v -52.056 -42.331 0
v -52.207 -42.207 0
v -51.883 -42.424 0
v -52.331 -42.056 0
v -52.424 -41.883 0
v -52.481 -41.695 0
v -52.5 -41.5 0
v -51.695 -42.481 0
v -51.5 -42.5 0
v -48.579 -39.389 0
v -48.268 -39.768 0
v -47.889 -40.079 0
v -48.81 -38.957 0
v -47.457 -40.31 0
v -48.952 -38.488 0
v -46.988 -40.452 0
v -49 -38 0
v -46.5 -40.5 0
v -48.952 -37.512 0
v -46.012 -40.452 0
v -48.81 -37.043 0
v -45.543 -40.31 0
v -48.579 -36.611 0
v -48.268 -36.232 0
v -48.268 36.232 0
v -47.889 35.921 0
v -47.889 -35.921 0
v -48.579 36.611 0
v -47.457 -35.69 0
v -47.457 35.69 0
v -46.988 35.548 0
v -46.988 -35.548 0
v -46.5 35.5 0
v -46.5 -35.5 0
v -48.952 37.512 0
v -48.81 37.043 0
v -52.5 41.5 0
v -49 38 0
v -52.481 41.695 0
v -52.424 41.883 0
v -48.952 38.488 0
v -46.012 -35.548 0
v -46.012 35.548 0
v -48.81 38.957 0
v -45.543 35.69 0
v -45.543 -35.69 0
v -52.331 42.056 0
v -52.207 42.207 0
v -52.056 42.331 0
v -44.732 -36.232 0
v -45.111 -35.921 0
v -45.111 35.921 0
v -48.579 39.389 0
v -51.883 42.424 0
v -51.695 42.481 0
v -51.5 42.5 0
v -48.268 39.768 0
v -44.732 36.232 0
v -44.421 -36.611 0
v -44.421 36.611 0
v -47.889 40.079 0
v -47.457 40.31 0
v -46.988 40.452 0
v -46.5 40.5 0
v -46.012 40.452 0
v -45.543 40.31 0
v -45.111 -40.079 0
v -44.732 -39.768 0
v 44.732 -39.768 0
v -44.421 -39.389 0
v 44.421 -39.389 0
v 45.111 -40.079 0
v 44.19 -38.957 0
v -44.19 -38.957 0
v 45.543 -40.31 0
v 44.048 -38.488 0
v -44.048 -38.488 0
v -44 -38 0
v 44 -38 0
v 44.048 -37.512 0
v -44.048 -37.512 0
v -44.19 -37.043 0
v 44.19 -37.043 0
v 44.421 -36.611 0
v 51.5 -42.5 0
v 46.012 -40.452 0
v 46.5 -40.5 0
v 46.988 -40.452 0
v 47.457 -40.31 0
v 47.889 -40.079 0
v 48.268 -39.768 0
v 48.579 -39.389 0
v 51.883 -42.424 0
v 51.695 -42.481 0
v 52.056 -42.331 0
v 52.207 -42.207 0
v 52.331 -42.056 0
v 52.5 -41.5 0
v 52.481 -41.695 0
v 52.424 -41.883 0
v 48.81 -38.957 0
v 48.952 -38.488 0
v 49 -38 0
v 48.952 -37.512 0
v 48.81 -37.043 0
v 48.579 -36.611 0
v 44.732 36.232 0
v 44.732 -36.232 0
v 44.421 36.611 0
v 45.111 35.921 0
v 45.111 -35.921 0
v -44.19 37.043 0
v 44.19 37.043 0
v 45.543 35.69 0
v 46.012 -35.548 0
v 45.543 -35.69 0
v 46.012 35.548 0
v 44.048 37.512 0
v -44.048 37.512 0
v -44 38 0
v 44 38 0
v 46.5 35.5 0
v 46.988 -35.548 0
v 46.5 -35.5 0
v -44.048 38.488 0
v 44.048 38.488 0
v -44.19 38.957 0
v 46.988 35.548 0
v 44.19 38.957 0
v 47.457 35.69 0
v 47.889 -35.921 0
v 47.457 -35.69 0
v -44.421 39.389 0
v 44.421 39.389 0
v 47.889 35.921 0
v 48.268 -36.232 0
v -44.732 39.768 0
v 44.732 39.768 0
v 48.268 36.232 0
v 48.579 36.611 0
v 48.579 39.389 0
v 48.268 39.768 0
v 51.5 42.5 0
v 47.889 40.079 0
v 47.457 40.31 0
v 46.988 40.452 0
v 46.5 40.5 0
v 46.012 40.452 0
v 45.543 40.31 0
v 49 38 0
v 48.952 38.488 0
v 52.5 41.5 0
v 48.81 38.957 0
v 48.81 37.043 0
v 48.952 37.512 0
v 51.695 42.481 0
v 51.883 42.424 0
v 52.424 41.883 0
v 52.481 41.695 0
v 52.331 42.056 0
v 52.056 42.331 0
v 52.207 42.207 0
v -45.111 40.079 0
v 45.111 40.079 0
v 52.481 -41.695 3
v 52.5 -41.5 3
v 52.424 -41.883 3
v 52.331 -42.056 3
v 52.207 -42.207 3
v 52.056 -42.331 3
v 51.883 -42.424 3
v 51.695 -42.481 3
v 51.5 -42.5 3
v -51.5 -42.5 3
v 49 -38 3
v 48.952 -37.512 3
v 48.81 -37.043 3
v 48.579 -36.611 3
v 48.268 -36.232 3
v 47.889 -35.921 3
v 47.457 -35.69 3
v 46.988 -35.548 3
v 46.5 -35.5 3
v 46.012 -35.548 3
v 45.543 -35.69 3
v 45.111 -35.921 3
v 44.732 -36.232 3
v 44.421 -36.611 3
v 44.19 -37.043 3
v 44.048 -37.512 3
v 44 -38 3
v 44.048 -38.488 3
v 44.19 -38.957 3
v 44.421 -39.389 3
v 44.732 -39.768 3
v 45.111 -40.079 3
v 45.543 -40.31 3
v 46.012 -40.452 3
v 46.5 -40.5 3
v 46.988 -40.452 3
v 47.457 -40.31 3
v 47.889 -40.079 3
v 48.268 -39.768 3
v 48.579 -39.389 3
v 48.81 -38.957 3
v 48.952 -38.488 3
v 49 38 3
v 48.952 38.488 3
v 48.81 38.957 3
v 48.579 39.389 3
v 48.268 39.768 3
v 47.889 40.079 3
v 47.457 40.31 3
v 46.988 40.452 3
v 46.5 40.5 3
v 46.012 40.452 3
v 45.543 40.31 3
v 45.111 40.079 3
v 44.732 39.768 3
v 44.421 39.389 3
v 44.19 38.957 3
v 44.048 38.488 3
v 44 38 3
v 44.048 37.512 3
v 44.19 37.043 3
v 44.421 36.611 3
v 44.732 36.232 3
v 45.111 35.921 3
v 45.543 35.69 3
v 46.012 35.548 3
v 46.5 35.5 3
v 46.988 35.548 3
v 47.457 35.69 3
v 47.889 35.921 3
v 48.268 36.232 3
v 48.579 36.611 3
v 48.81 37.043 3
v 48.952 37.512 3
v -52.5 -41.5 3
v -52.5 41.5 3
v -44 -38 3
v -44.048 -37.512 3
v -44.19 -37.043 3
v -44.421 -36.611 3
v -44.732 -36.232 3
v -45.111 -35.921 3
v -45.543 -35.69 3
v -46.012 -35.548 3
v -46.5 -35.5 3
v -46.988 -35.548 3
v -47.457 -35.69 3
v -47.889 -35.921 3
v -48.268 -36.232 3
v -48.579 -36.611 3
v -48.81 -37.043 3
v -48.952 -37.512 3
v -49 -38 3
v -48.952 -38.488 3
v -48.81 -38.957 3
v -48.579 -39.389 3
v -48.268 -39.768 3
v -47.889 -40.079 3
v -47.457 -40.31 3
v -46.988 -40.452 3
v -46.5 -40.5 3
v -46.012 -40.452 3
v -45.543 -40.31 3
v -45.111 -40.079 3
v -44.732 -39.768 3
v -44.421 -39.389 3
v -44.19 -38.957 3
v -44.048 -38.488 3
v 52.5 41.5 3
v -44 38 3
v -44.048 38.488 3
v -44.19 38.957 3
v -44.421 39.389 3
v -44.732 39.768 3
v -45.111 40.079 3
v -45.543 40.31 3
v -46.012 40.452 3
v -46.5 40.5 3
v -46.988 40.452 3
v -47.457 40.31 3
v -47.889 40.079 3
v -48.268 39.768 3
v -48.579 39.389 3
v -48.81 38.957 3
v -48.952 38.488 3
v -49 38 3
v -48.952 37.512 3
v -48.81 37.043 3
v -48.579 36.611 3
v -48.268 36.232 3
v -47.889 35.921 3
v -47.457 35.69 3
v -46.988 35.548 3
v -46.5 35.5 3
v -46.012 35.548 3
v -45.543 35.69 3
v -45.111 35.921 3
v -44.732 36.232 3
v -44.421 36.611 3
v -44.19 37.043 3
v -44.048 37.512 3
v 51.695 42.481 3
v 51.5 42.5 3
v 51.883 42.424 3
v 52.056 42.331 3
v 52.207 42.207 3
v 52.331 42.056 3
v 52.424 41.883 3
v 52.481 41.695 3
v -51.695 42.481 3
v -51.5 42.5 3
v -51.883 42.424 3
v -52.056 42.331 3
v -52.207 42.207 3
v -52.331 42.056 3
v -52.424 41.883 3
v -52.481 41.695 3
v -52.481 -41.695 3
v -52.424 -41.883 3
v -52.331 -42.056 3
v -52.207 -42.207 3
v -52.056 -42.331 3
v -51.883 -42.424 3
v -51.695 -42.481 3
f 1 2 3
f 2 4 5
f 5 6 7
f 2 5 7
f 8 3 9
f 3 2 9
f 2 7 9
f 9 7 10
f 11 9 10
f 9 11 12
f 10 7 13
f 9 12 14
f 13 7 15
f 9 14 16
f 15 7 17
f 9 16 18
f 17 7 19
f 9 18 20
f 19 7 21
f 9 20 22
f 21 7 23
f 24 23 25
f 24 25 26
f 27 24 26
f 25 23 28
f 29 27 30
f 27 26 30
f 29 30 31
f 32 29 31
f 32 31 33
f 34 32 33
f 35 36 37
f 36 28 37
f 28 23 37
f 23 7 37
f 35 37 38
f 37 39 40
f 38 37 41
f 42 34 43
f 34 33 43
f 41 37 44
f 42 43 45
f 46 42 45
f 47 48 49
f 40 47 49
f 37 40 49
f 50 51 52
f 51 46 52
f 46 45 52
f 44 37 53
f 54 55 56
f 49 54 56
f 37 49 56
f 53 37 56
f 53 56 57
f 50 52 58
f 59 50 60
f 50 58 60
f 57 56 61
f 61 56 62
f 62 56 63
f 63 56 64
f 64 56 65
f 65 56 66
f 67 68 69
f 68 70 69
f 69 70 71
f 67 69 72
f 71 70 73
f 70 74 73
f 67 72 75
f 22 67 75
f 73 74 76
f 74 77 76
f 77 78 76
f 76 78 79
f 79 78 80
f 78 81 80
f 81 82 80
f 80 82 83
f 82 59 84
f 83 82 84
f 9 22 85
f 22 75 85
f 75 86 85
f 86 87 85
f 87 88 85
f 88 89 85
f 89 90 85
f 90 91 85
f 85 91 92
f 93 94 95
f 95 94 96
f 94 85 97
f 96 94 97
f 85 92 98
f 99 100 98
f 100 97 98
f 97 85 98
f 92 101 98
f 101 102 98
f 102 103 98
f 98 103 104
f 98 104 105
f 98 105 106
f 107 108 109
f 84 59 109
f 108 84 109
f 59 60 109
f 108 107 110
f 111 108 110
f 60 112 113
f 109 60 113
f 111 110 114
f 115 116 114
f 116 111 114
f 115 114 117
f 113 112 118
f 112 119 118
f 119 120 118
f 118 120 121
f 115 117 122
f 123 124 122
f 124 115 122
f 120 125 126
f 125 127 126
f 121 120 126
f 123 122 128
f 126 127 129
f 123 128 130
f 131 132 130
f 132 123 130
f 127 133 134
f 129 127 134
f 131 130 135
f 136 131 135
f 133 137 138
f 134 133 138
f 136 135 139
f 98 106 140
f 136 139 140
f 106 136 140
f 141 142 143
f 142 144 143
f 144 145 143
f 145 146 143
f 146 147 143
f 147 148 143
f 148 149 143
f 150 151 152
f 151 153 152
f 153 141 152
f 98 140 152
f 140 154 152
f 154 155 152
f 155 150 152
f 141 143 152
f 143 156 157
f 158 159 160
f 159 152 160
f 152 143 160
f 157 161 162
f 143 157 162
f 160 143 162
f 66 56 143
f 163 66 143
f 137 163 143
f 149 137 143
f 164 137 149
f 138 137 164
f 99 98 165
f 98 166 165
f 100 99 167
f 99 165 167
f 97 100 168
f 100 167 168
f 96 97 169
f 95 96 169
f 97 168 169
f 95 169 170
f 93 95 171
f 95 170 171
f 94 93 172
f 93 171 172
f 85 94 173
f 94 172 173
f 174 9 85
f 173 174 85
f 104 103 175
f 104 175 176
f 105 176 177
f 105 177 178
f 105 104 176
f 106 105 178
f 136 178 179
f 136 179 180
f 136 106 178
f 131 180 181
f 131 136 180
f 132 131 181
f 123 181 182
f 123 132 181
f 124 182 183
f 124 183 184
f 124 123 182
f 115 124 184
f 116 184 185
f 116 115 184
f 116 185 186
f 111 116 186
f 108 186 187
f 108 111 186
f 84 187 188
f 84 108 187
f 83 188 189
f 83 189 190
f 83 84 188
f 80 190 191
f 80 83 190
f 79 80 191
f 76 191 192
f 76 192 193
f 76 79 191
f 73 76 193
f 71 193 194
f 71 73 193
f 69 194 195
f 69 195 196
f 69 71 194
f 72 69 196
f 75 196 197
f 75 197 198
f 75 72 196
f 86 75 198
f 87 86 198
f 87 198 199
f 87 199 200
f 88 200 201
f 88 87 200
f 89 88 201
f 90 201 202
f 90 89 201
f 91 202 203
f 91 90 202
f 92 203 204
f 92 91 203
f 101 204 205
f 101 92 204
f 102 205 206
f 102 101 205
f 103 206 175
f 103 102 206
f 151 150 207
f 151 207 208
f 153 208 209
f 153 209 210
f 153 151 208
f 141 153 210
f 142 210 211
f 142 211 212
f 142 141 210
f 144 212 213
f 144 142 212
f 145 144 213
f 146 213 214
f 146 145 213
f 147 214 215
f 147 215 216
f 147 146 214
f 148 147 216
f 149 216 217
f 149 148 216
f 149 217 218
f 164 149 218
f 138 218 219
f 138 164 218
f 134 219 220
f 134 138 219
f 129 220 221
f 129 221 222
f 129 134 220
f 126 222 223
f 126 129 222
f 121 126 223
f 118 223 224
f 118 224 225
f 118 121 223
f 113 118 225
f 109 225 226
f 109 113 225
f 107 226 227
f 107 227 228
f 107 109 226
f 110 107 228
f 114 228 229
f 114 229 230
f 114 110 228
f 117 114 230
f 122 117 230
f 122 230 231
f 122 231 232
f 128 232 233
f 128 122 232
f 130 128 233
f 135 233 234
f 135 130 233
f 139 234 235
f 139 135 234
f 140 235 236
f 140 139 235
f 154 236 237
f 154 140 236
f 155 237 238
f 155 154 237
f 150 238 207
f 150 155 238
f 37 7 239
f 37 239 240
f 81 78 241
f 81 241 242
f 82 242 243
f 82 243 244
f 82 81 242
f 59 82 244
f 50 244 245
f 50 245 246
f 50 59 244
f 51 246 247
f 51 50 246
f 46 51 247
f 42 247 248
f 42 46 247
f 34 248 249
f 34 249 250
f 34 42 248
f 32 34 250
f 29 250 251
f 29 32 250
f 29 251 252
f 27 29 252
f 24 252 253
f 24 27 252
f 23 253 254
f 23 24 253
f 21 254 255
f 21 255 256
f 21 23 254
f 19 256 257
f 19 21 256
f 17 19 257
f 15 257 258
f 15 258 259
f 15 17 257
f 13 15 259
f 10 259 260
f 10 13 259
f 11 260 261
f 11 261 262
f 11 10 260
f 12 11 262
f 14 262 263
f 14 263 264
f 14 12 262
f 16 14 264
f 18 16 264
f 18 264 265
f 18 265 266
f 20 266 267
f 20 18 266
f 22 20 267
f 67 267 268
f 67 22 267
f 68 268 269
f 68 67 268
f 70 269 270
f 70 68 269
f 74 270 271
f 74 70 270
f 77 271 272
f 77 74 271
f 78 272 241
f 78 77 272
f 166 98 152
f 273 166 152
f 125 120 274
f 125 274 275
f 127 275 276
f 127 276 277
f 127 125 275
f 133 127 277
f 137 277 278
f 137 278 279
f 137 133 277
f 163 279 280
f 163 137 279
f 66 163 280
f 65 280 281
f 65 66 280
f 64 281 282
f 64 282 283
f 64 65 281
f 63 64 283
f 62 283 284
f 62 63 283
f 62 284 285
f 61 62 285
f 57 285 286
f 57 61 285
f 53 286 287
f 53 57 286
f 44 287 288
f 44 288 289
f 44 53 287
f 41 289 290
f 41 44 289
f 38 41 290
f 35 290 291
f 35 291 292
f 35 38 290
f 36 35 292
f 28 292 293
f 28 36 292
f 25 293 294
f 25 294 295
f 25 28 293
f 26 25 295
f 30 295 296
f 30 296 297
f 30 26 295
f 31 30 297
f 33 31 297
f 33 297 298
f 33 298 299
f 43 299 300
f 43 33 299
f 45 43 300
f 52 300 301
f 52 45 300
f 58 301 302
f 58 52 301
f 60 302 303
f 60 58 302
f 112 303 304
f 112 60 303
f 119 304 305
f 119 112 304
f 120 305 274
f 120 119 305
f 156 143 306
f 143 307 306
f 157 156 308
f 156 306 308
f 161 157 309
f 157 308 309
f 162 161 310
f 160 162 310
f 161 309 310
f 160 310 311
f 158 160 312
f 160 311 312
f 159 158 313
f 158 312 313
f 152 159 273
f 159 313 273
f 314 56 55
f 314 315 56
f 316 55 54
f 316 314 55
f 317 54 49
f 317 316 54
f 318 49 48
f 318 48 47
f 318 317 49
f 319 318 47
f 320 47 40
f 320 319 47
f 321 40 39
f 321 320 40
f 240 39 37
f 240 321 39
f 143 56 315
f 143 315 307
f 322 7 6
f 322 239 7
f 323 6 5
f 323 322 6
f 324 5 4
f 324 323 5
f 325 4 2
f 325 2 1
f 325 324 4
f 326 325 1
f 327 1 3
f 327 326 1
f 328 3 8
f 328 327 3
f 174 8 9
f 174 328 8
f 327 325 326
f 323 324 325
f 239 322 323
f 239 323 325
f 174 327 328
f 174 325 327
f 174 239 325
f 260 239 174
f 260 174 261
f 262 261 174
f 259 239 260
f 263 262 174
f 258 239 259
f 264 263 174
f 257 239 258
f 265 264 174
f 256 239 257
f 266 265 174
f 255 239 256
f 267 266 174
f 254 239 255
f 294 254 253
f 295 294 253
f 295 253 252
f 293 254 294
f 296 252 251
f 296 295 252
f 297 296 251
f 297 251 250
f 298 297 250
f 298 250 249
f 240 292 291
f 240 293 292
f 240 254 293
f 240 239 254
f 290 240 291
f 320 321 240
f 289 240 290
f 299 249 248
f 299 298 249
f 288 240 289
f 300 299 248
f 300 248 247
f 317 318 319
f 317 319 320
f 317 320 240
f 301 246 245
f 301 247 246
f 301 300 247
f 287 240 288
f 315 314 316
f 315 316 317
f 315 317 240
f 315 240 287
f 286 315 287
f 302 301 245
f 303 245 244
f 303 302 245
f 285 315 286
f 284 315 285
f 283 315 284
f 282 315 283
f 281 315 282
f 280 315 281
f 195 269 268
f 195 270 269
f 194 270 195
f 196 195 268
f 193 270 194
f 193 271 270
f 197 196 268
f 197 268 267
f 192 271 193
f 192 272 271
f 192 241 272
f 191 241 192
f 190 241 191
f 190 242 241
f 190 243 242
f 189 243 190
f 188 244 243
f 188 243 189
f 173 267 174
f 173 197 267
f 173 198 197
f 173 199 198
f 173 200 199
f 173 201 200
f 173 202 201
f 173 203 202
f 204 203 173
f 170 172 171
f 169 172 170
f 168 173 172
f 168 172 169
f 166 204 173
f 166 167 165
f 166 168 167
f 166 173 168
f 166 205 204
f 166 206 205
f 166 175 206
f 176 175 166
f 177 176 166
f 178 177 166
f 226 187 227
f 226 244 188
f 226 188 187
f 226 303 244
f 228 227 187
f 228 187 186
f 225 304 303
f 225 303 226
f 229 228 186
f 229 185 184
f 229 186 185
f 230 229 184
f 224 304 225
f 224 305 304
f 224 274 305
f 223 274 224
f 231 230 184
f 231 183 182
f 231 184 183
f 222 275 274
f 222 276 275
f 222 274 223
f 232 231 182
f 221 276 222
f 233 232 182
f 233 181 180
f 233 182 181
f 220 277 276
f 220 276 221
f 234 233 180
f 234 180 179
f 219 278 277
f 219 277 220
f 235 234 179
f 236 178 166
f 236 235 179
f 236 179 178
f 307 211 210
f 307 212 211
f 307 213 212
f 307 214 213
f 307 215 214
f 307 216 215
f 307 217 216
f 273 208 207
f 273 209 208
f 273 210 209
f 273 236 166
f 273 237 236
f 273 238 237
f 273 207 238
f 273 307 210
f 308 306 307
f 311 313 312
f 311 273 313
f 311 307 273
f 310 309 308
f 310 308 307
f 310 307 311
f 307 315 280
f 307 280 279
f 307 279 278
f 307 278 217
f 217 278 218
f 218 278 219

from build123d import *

# Parameters (mm, degrees)
SKETCH_W    = 105
SKETCH_H    = 85
SKETCH_R    = 2.5
PAD_DEPTH   = 3
FILLET_R    = 1
FILLET001_R = 1


with BuildPart() as part:
    # Sketch → Pad (new body)
    with BuildSketch(Plane.XY):
        Rectangle(SKETCH_W, SKETCH_H)
        with Locations((-46.5, 38)):
            Circle(SKETCH_R, mode=Mode.SUBTRACT)
        with Locations((46.5, 38)):
            Circle(SKETCH_R, mode=Mode.SUBTRACT)
        with Locations((-46.5, -38)):
            Circle(SKETCH_R, mode=Mode.SUBTRACT)
        with Locations((46.5, -38)):
            Circle(SKETCH_R, mode=Mode.SUBTRACT)
    extrude(amount=PAD_DEPTH)

    # Fillet
    fillet_edges = [part.edges().sort_by_distance(p)[0] for p in [
        (52.5, 42.5, 1.5),
    ]]
    fillet(fillet_edges, radius=FILLET_R)

    # Fillet001
    fillet001_edges = [part.edges().sort_by_distance(p)[0] for p in [
        (-52.5, 42.5, 1.5),
        (52.5, -42.5, 1.5),
        (-52.5, -42.5, 1.5),
    ]]
    fillet(fillet001_edges, radius=FILLET001_R)


solid = part.part
